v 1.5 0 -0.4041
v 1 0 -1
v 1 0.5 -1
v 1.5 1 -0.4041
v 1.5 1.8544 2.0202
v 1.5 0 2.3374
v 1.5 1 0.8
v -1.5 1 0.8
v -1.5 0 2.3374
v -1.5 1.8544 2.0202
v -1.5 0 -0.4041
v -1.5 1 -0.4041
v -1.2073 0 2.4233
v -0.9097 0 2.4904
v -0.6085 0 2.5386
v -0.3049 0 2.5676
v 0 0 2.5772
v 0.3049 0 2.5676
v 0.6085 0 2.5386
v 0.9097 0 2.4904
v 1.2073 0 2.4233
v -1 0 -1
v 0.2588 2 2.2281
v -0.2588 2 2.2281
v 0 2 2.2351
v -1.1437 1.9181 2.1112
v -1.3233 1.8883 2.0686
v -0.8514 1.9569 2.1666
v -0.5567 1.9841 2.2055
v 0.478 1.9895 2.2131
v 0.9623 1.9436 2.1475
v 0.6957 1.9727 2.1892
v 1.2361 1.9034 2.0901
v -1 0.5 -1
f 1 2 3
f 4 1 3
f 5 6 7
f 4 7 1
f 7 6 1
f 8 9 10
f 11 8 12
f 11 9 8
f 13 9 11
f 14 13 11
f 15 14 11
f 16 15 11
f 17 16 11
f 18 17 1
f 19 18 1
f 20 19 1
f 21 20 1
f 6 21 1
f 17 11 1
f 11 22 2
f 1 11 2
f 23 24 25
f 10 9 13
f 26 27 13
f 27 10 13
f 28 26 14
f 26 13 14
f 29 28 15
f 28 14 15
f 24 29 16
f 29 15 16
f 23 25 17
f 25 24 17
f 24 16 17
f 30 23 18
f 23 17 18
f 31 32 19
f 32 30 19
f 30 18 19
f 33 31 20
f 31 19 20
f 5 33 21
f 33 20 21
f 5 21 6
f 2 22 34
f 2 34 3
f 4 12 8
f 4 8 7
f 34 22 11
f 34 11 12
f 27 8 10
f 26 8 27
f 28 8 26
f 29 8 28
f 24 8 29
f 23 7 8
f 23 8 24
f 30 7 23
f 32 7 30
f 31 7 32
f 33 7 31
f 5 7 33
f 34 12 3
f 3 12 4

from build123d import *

# Parameters (mm, degrees)
SKETCH_1_W          = 3
SKETCH_1_H          = 3.8
EXTRUDE_1_DEPTH     = 1
SKETCH_2_W          = 3
SKETCH_2_H          = 2
EXTRUDE_2_DEPTH     = 1
CHAMFER_1_SIZE      = 0.5
CHAMFER_1_SIZE2     = 0.595876796
CHAMFER_3_SIZE      = 1
CHAMFER_3_SIZE_2    = 1.428148007
CUT_EXTRUDE_1_DEPTH = 3.4


with BuildPart() as part:
    # 草图1 → 凸台-拉伸1 (new body)
    with BuildSketch(Plane(origin=(0, 0, 0), x_dir=(1, 0, 0), z_dir=(0, 1, 0))):
        with Locations((0, -0.9)):
            Rectangle(SKETCH_1_W, SKETCH_1_H)
    extrude(amount=EXTRUDE_1_DEPTH)

    # 草图2 → 凸台-拉伸2 (add)
    with BuildSketch(Plane(origin=(0, 1, 0), x_dir=(1, 0, 0), z_dir=(0, 1, 0))):
        with Locations((0, -1.8)):
            Rectangle(SKETCH_2_W, SKETCH_2_H)
    extrude(amount=EXTRUDE_2_DEPTH)

    # 倒角1
    chamfer_1_edges = [part.edges().sort_by_distance(p)[0] for p in [
        (0, 1, -1),
        (-1.5, 0.5, -1),
        (1.5, 0.5, -1),
    ]]
    chamfer_1_side = [part.faces().sort_by_distance(p)[0] for p in [
        (0, 0.5, -1),
    ]]
    chamfer(chamfer_1_edges, length=CHAMFER_1_SIZE, length2=CHAMFER_1_SIZE2, reference=chamfer_1_side[0])

    # 倒角3
    # the kernel refuses this chamfer: 1.428148007, 1 mm, written as the material it takes off along each edge
    with BuildSketch(Plane(origin=(5.18826682, 2, 0.8), x_dir=(0, -0.9989750717851554, -0.04526373771402124), z_dir=(-1, 0, 0))) as chamfer_3_piece_1_section:
        Polygon((CHAMFER_3_SIZE * 0.998975071785, CHAMFER_3_SIZE * 0.045263737714), (-CHAMFER_3_SIZE_2 * 0.0452637377058, CHAMFER_3_SIZE_2 * 0.998975071605), (0, 0), align=None)
    chamfer_3_piece_1 = extrude(amount=10.37653364, mode=Mode.PRIVATE)
    chamfer_3_piece_1 = split(chamfer_3_piece_1, bisect_by=Plane(origin=(0, 1, 1.276872226), z_dir=(0, 1, 0)), keep=Keep.TOP, mode=Mode.PRIVATE)
    add(chamfer_3_piece_1, mode=Mode.SUBTRACT)

    # 草图4 → 切除-拉伸1 (cut, along a direction that is not the sketch's normal)
    with BuildSketch(Plane.XZ):
        with BuildLine():
            Line((1.59999292, 2.303360359), (2.090500244, 2.793867684))
            Line((2.090500244, 2.793867684), (1.845246582, 3.265265737))
            Line((1.845246582, 3.265265737), (0.278729323, 3.46880384))
            Line((0.278729323, 3.46880384), (-0.130829053, 3.46880384))
            Line((-0.130829053, 3.46880384), (-1.91054636, 3.486179043))
            Line((-1.91054636, 3.486179043), (-2.191031794, 2.570257584))
            Line((-2.191031794, 2.570257584), (-1.60000708, 2.303360359))
            ThreePointArc((-1.60000708, 2.303360359), (-7.08e-06, 2.577223661), (1.59999292, 2.303360359))
        make_face()
    extrude(amount=-CUT_EXTRUDE_1_DEPTH, dir=(0, -0.9856835463912937, 0.16860589068440726), mode=Mode.SUBTRACT)


solid = part.part
